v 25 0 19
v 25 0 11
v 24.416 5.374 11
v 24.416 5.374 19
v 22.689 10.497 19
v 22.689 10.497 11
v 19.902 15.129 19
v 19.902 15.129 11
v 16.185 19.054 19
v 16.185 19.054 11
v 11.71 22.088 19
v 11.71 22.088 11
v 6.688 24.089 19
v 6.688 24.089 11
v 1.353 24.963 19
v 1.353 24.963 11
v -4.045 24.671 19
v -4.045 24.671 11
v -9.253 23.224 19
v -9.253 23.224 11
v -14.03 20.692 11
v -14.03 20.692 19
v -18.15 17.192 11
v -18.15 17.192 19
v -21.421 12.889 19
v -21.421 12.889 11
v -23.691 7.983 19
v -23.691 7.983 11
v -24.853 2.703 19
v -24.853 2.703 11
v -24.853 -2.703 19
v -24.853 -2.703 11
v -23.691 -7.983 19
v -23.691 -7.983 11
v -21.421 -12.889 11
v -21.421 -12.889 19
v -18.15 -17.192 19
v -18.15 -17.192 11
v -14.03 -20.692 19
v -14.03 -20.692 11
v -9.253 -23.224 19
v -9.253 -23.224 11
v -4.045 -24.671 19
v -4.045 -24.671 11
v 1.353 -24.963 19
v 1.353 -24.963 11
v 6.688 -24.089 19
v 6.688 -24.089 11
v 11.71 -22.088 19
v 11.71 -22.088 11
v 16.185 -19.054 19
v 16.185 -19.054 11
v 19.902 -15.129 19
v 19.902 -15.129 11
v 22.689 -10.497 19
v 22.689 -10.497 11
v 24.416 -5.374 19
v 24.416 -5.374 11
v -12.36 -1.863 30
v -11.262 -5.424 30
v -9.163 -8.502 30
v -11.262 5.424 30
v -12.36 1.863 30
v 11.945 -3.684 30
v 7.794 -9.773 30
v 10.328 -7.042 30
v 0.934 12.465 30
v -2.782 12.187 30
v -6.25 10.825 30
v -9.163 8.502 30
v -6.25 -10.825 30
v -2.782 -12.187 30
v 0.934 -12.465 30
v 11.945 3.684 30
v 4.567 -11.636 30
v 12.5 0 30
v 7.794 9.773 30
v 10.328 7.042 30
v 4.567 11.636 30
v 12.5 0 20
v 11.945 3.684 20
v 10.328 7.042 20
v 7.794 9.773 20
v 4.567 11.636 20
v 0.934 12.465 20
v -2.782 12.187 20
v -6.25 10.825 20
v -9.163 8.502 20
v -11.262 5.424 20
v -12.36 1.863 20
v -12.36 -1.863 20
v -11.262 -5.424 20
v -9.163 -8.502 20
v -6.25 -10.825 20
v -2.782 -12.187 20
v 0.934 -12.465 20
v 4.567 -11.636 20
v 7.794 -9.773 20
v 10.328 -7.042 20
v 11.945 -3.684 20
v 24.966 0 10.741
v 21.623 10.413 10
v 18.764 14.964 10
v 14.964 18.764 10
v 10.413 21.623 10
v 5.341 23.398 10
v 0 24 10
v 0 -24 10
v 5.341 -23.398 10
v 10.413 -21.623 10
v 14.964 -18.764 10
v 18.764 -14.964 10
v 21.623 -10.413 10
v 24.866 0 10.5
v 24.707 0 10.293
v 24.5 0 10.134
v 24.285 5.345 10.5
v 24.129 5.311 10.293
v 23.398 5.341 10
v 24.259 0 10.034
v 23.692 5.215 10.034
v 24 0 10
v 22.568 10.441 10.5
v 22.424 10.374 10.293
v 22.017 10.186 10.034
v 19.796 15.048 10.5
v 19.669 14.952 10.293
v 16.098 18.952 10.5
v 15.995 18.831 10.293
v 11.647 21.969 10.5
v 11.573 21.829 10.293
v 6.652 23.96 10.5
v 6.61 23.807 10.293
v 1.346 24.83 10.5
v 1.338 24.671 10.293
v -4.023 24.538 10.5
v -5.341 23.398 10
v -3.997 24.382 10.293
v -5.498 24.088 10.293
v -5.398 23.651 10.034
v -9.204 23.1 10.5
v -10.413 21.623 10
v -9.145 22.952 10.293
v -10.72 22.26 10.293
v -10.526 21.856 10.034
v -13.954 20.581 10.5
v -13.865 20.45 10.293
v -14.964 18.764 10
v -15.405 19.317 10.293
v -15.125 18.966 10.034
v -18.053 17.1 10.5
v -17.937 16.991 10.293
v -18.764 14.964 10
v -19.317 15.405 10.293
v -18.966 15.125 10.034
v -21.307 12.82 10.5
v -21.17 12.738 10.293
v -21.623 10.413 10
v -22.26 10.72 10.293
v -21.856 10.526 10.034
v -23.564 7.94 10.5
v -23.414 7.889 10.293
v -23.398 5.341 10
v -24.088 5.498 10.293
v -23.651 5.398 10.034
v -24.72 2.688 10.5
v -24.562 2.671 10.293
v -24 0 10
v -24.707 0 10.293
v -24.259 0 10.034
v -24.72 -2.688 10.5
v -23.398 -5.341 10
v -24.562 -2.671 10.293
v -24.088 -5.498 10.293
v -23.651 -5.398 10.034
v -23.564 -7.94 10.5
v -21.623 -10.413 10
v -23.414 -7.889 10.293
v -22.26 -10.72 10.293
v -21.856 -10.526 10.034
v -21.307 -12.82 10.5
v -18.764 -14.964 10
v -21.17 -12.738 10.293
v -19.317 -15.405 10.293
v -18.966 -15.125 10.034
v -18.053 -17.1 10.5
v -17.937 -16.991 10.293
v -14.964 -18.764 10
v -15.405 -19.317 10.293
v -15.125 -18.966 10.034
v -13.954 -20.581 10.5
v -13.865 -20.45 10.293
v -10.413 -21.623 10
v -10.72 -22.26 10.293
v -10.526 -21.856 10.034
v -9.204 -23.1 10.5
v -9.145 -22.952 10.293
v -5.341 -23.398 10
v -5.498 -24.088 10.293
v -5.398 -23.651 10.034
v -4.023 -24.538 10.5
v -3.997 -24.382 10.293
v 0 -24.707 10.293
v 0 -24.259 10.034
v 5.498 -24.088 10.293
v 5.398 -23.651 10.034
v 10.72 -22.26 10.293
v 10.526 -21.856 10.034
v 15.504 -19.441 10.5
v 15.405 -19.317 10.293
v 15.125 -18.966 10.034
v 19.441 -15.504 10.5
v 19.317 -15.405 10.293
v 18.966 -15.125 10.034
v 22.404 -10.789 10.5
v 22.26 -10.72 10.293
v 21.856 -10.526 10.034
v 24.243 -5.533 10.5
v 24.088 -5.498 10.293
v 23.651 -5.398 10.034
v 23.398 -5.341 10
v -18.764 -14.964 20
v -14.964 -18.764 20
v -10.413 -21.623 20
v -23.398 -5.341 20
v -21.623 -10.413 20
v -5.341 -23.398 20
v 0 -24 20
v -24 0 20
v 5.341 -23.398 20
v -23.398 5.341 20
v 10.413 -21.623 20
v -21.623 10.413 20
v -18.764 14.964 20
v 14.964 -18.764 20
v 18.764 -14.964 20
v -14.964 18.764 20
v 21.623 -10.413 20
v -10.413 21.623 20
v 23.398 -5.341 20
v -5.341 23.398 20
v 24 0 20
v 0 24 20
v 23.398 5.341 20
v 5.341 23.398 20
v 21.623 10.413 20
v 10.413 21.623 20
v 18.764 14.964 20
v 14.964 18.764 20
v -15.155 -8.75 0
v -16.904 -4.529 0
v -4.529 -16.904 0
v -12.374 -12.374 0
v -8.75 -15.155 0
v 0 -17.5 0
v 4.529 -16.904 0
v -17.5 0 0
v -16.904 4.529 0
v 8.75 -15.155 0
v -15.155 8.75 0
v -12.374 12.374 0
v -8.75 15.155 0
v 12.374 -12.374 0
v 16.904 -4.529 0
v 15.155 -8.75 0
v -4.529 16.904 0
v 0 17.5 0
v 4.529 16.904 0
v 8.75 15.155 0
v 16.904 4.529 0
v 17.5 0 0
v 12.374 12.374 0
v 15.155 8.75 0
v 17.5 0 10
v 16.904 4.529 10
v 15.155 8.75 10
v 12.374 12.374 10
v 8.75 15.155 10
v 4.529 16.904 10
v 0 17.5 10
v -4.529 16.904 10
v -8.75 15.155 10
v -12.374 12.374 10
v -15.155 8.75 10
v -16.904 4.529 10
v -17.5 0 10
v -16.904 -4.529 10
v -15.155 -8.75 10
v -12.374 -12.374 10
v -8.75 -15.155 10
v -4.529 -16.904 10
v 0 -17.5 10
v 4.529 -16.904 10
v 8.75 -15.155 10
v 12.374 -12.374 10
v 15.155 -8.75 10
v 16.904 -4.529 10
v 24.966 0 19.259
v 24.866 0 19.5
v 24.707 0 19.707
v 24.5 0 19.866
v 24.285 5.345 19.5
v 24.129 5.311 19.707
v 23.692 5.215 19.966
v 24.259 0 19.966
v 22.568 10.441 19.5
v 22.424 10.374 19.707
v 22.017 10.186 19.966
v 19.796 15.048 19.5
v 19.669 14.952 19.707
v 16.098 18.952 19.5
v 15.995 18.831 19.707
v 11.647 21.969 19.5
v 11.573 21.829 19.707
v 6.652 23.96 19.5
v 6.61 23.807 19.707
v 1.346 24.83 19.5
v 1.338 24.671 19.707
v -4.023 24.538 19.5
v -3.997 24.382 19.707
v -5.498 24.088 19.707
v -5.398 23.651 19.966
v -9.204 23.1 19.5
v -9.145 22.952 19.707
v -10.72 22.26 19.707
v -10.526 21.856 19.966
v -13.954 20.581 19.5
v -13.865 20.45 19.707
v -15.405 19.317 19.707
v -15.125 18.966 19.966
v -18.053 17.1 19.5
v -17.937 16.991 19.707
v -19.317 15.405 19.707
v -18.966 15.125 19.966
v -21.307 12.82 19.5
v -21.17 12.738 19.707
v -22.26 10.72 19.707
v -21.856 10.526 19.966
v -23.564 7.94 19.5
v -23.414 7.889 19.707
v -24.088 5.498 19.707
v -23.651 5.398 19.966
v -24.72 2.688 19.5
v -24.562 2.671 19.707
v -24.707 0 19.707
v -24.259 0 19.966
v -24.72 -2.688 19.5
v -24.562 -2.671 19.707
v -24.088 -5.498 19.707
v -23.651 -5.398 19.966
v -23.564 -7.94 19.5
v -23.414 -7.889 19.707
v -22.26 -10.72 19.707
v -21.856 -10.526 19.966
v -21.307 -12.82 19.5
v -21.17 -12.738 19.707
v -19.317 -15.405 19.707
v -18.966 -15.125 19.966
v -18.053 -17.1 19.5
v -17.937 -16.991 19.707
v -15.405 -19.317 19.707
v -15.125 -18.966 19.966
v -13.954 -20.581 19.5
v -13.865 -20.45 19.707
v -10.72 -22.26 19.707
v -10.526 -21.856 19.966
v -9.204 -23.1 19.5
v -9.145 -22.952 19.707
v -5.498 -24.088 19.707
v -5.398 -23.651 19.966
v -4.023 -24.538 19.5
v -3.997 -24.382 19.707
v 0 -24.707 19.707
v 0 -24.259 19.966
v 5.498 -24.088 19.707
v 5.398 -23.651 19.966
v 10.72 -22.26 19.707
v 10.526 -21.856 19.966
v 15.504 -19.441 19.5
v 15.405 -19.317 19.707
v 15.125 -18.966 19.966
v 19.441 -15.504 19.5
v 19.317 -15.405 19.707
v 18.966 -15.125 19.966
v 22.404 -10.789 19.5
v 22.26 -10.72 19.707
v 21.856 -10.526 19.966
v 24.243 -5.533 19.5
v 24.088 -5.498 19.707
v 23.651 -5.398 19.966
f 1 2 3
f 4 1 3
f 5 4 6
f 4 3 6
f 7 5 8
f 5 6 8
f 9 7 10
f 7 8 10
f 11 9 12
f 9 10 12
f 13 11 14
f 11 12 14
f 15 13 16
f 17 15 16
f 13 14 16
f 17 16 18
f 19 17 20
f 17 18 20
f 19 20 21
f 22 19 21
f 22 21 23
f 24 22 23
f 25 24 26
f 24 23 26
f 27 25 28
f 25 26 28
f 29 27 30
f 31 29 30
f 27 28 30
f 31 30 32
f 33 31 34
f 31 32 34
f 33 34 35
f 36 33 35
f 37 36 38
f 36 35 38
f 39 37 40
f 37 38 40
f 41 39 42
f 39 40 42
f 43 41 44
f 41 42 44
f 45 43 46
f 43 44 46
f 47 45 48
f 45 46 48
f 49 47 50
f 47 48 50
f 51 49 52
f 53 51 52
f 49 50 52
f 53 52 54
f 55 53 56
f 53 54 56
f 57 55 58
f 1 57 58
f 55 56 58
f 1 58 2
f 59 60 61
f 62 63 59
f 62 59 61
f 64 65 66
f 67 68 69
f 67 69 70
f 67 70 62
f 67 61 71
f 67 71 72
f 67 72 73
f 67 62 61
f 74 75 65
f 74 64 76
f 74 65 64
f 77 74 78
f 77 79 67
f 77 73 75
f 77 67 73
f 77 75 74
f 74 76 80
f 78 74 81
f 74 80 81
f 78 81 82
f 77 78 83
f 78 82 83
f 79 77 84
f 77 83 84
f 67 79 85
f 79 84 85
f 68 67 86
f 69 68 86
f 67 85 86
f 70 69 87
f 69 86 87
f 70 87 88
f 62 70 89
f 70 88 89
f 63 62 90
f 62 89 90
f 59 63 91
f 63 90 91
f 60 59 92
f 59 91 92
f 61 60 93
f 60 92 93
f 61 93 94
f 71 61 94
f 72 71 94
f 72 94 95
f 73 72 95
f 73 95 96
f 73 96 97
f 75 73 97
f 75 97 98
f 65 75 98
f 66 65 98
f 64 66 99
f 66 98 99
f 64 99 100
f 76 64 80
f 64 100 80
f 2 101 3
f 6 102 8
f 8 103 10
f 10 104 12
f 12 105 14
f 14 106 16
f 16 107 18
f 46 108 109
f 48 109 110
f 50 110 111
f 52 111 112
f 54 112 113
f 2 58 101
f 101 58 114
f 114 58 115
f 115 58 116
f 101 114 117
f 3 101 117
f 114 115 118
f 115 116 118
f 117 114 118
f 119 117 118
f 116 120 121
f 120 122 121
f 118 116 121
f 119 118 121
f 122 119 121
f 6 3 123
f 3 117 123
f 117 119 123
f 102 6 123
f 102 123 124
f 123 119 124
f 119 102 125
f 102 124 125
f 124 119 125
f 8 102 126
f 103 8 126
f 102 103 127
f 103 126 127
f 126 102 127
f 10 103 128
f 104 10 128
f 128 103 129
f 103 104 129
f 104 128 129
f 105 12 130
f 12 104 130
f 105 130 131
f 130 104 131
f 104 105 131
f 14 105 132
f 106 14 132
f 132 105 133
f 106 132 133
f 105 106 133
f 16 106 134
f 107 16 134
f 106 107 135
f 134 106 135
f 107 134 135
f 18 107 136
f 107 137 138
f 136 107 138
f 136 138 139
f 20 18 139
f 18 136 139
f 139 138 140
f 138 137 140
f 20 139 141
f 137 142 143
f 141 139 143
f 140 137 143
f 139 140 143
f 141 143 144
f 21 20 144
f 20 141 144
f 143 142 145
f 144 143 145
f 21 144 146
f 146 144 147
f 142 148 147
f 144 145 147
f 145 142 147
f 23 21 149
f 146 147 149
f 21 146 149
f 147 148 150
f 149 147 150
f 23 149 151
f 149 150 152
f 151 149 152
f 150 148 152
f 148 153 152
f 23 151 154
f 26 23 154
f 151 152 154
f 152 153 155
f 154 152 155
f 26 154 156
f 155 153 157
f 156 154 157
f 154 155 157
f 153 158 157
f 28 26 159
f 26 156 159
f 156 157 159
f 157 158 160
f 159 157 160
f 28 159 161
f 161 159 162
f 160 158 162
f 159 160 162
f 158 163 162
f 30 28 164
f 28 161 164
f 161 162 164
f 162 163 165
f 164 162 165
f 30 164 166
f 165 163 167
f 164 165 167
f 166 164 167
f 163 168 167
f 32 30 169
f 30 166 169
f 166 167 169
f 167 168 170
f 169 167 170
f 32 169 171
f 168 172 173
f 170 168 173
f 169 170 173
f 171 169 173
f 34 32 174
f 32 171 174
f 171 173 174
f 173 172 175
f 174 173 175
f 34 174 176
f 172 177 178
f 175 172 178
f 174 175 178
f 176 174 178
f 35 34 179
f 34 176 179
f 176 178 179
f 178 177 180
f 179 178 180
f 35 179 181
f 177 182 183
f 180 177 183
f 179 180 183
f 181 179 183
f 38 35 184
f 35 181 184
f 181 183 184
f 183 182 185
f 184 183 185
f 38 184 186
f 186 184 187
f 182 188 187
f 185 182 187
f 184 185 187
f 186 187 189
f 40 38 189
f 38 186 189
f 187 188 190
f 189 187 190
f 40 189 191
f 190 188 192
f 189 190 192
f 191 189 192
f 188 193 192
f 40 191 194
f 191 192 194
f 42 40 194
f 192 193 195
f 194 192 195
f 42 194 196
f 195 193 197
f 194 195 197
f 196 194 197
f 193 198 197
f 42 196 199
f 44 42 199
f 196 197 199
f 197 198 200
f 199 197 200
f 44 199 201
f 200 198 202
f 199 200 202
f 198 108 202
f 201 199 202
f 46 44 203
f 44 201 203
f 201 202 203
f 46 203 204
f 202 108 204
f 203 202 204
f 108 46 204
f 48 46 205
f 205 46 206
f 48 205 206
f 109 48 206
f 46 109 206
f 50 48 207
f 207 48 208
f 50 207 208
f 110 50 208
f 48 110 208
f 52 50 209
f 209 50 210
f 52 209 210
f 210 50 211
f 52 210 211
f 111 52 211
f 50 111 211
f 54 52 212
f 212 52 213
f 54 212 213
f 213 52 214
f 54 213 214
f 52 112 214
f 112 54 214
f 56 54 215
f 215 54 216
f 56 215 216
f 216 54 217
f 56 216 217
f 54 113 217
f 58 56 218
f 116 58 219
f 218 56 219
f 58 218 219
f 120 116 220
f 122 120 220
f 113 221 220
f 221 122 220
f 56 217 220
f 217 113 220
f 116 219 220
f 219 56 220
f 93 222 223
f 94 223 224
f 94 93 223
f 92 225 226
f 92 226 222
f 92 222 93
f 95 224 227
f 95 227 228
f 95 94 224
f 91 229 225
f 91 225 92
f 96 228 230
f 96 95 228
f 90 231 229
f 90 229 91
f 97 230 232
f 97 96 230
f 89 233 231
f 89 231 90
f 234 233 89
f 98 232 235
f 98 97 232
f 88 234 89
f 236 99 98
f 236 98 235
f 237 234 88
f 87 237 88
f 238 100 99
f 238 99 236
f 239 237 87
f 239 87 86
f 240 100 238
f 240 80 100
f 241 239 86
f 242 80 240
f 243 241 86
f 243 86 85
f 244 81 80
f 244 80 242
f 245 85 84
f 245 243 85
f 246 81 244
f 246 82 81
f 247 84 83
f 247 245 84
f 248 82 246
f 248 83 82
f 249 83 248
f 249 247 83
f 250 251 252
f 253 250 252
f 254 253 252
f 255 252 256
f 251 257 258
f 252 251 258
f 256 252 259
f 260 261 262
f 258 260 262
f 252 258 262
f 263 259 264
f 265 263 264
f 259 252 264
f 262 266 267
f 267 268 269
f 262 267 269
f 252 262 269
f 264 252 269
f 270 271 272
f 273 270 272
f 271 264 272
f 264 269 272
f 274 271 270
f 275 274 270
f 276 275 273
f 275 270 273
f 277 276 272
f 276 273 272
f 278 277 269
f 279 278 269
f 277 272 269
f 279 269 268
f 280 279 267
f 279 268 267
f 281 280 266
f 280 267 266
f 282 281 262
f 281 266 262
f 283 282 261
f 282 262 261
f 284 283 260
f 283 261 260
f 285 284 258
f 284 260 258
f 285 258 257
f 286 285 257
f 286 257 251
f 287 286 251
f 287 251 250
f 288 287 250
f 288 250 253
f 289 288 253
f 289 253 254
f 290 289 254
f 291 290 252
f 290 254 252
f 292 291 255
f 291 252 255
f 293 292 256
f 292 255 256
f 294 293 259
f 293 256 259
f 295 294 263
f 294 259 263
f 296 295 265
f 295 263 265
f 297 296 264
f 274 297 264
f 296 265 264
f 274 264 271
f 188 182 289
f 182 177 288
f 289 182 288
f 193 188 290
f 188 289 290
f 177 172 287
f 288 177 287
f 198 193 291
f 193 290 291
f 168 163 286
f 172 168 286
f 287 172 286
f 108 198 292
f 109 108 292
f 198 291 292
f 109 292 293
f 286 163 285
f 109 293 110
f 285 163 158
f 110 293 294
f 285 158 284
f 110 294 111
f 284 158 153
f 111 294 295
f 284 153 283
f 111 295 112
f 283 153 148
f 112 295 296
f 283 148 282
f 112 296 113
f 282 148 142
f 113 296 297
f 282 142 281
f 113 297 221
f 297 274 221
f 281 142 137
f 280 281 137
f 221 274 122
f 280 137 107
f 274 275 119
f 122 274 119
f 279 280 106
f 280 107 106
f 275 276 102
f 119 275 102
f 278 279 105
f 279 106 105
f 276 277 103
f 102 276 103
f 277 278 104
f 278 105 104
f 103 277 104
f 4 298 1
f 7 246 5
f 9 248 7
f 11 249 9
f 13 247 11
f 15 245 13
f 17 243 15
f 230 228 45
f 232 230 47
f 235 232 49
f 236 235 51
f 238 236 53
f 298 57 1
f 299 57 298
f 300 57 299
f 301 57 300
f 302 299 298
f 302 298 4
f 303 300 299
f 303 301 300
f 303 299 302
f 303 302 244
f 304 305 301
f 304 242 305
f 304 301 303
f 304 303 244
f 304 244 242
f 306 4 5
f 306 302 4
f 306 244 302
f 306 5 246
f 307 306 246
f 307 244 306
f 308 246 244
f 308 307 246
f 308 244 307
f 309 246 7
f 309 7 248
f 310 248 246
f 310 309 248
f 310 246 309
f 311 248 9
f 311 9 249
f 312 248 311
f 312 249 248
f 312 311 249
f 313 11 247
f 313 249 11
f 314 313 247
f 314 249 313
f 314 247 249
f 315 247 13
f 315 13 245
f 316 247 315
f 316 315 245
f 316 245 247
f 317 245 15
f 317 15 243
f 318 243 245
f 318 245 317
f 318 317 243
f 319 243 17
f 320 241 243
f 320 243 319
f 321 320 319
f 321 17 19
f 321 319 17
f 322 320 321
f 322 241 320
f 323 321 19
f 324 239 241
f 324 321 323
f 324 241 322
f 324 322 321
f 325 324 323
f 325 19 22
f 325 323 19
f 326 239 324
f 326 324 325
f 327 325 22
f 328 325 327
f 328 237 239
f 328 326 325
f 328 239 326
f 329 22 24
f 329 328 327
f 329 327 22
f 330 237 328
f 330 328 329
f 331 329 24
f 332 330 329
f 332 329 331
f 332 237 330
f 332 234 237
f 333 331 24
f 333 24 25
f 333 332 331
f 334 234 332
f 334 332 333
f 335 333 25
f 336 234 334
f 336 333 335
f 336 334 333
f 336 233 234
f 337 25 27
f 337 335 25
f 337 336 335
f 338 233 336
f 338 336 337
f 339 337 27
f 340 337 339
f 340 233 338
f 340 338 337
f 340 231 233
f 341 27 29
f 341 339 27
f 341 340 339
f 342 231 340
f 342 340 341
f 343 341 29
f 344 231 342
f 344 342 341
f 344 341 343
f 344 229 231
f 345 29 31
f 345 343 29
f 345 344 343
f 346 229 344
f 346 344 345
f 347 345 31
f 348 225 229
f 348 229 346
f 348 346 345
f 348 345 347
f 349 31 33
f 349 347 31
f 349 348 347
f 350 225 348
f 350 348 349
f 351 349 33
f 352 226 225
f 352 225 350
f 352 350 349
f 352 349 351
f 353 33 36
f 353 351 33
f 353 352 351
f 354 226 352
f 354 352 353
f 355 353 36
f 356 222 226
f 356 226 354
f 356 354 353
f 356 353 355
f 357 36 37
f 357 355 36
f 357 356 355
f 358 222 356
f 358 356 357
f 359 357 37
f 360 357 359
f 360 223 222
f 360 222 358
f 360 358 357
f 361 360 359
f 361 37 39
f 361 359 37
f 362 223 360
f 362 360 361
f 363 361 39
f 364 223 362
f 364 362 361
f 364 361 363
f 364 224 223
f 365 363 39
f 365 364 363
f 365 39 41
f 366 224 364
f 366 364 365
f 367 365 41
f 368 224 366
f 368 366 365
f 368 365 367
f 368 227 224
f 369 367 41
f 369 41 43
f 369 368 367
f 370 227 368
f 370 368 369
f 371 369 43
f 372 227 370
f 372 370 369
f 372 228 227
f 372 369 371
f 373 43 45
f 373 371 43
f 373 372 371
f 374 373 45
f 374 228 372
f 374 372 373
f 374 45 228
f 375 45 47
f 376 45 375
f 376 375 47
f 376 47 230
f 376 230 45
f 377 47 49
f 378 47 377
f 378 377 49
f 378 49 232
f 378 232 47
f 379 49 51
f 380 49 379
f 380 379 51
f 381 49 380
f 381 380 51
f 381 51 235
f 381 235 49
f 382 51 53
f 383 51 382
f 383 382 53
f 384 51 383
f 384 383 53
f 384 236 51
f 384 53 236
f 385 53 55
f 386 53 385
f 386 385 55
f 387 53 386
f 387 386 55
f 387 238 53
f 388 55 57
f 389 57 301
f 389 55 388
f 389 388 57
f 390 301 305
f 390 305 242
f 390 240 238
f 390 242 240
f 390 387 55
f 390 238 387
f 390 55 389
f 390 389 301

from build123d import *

# Parameters (mm, degrees)
SKETCH1_R           = 17.5
BOSS_EXTRUDE1_DEPTH = 10
SKETCH2_R           = 25
BOSS_EXTRUDE2_DEPTH = 10
SKETCH3_R           = 12.5
BOSS_EXTRUDE3_DEPTH = 10
FILLET1_R           = 1


with BuildPart() as part:
    # Sketch1 → Boss-Extrude1 (new body)
    with BuildSketch(Plane.XY):
        Circle(SKETCH1_R)
    extrude(amount=BOSS_EXTRUDE1_DEPTH)

    # Sketch2 → Boss-Extrude2 (add)
    with BuildSketch(Plane.XY.offset(10)):
        Circle(SKETCH2_R)
    extrude(amount=BOSS_EXTRUDE2_DEPTH)

    # Sketch3 → Boss-Extrude3 (add)
    with BuildSketch(Plane.XY.offset(20)):
        Circle(SKETCH3_R)
    extrude(amount=BOSS_EXTRUDE3_DEPTH)

    # Fillet1
    fillet1_edges = [part.edges().sort_by_distance(p)[0] for p in [
        (-25, 0, 10),
        (-25, 0, 20),
    ]]
    fillet(fillet1_edges, radius=FILLET1_R)


solid = part.part
